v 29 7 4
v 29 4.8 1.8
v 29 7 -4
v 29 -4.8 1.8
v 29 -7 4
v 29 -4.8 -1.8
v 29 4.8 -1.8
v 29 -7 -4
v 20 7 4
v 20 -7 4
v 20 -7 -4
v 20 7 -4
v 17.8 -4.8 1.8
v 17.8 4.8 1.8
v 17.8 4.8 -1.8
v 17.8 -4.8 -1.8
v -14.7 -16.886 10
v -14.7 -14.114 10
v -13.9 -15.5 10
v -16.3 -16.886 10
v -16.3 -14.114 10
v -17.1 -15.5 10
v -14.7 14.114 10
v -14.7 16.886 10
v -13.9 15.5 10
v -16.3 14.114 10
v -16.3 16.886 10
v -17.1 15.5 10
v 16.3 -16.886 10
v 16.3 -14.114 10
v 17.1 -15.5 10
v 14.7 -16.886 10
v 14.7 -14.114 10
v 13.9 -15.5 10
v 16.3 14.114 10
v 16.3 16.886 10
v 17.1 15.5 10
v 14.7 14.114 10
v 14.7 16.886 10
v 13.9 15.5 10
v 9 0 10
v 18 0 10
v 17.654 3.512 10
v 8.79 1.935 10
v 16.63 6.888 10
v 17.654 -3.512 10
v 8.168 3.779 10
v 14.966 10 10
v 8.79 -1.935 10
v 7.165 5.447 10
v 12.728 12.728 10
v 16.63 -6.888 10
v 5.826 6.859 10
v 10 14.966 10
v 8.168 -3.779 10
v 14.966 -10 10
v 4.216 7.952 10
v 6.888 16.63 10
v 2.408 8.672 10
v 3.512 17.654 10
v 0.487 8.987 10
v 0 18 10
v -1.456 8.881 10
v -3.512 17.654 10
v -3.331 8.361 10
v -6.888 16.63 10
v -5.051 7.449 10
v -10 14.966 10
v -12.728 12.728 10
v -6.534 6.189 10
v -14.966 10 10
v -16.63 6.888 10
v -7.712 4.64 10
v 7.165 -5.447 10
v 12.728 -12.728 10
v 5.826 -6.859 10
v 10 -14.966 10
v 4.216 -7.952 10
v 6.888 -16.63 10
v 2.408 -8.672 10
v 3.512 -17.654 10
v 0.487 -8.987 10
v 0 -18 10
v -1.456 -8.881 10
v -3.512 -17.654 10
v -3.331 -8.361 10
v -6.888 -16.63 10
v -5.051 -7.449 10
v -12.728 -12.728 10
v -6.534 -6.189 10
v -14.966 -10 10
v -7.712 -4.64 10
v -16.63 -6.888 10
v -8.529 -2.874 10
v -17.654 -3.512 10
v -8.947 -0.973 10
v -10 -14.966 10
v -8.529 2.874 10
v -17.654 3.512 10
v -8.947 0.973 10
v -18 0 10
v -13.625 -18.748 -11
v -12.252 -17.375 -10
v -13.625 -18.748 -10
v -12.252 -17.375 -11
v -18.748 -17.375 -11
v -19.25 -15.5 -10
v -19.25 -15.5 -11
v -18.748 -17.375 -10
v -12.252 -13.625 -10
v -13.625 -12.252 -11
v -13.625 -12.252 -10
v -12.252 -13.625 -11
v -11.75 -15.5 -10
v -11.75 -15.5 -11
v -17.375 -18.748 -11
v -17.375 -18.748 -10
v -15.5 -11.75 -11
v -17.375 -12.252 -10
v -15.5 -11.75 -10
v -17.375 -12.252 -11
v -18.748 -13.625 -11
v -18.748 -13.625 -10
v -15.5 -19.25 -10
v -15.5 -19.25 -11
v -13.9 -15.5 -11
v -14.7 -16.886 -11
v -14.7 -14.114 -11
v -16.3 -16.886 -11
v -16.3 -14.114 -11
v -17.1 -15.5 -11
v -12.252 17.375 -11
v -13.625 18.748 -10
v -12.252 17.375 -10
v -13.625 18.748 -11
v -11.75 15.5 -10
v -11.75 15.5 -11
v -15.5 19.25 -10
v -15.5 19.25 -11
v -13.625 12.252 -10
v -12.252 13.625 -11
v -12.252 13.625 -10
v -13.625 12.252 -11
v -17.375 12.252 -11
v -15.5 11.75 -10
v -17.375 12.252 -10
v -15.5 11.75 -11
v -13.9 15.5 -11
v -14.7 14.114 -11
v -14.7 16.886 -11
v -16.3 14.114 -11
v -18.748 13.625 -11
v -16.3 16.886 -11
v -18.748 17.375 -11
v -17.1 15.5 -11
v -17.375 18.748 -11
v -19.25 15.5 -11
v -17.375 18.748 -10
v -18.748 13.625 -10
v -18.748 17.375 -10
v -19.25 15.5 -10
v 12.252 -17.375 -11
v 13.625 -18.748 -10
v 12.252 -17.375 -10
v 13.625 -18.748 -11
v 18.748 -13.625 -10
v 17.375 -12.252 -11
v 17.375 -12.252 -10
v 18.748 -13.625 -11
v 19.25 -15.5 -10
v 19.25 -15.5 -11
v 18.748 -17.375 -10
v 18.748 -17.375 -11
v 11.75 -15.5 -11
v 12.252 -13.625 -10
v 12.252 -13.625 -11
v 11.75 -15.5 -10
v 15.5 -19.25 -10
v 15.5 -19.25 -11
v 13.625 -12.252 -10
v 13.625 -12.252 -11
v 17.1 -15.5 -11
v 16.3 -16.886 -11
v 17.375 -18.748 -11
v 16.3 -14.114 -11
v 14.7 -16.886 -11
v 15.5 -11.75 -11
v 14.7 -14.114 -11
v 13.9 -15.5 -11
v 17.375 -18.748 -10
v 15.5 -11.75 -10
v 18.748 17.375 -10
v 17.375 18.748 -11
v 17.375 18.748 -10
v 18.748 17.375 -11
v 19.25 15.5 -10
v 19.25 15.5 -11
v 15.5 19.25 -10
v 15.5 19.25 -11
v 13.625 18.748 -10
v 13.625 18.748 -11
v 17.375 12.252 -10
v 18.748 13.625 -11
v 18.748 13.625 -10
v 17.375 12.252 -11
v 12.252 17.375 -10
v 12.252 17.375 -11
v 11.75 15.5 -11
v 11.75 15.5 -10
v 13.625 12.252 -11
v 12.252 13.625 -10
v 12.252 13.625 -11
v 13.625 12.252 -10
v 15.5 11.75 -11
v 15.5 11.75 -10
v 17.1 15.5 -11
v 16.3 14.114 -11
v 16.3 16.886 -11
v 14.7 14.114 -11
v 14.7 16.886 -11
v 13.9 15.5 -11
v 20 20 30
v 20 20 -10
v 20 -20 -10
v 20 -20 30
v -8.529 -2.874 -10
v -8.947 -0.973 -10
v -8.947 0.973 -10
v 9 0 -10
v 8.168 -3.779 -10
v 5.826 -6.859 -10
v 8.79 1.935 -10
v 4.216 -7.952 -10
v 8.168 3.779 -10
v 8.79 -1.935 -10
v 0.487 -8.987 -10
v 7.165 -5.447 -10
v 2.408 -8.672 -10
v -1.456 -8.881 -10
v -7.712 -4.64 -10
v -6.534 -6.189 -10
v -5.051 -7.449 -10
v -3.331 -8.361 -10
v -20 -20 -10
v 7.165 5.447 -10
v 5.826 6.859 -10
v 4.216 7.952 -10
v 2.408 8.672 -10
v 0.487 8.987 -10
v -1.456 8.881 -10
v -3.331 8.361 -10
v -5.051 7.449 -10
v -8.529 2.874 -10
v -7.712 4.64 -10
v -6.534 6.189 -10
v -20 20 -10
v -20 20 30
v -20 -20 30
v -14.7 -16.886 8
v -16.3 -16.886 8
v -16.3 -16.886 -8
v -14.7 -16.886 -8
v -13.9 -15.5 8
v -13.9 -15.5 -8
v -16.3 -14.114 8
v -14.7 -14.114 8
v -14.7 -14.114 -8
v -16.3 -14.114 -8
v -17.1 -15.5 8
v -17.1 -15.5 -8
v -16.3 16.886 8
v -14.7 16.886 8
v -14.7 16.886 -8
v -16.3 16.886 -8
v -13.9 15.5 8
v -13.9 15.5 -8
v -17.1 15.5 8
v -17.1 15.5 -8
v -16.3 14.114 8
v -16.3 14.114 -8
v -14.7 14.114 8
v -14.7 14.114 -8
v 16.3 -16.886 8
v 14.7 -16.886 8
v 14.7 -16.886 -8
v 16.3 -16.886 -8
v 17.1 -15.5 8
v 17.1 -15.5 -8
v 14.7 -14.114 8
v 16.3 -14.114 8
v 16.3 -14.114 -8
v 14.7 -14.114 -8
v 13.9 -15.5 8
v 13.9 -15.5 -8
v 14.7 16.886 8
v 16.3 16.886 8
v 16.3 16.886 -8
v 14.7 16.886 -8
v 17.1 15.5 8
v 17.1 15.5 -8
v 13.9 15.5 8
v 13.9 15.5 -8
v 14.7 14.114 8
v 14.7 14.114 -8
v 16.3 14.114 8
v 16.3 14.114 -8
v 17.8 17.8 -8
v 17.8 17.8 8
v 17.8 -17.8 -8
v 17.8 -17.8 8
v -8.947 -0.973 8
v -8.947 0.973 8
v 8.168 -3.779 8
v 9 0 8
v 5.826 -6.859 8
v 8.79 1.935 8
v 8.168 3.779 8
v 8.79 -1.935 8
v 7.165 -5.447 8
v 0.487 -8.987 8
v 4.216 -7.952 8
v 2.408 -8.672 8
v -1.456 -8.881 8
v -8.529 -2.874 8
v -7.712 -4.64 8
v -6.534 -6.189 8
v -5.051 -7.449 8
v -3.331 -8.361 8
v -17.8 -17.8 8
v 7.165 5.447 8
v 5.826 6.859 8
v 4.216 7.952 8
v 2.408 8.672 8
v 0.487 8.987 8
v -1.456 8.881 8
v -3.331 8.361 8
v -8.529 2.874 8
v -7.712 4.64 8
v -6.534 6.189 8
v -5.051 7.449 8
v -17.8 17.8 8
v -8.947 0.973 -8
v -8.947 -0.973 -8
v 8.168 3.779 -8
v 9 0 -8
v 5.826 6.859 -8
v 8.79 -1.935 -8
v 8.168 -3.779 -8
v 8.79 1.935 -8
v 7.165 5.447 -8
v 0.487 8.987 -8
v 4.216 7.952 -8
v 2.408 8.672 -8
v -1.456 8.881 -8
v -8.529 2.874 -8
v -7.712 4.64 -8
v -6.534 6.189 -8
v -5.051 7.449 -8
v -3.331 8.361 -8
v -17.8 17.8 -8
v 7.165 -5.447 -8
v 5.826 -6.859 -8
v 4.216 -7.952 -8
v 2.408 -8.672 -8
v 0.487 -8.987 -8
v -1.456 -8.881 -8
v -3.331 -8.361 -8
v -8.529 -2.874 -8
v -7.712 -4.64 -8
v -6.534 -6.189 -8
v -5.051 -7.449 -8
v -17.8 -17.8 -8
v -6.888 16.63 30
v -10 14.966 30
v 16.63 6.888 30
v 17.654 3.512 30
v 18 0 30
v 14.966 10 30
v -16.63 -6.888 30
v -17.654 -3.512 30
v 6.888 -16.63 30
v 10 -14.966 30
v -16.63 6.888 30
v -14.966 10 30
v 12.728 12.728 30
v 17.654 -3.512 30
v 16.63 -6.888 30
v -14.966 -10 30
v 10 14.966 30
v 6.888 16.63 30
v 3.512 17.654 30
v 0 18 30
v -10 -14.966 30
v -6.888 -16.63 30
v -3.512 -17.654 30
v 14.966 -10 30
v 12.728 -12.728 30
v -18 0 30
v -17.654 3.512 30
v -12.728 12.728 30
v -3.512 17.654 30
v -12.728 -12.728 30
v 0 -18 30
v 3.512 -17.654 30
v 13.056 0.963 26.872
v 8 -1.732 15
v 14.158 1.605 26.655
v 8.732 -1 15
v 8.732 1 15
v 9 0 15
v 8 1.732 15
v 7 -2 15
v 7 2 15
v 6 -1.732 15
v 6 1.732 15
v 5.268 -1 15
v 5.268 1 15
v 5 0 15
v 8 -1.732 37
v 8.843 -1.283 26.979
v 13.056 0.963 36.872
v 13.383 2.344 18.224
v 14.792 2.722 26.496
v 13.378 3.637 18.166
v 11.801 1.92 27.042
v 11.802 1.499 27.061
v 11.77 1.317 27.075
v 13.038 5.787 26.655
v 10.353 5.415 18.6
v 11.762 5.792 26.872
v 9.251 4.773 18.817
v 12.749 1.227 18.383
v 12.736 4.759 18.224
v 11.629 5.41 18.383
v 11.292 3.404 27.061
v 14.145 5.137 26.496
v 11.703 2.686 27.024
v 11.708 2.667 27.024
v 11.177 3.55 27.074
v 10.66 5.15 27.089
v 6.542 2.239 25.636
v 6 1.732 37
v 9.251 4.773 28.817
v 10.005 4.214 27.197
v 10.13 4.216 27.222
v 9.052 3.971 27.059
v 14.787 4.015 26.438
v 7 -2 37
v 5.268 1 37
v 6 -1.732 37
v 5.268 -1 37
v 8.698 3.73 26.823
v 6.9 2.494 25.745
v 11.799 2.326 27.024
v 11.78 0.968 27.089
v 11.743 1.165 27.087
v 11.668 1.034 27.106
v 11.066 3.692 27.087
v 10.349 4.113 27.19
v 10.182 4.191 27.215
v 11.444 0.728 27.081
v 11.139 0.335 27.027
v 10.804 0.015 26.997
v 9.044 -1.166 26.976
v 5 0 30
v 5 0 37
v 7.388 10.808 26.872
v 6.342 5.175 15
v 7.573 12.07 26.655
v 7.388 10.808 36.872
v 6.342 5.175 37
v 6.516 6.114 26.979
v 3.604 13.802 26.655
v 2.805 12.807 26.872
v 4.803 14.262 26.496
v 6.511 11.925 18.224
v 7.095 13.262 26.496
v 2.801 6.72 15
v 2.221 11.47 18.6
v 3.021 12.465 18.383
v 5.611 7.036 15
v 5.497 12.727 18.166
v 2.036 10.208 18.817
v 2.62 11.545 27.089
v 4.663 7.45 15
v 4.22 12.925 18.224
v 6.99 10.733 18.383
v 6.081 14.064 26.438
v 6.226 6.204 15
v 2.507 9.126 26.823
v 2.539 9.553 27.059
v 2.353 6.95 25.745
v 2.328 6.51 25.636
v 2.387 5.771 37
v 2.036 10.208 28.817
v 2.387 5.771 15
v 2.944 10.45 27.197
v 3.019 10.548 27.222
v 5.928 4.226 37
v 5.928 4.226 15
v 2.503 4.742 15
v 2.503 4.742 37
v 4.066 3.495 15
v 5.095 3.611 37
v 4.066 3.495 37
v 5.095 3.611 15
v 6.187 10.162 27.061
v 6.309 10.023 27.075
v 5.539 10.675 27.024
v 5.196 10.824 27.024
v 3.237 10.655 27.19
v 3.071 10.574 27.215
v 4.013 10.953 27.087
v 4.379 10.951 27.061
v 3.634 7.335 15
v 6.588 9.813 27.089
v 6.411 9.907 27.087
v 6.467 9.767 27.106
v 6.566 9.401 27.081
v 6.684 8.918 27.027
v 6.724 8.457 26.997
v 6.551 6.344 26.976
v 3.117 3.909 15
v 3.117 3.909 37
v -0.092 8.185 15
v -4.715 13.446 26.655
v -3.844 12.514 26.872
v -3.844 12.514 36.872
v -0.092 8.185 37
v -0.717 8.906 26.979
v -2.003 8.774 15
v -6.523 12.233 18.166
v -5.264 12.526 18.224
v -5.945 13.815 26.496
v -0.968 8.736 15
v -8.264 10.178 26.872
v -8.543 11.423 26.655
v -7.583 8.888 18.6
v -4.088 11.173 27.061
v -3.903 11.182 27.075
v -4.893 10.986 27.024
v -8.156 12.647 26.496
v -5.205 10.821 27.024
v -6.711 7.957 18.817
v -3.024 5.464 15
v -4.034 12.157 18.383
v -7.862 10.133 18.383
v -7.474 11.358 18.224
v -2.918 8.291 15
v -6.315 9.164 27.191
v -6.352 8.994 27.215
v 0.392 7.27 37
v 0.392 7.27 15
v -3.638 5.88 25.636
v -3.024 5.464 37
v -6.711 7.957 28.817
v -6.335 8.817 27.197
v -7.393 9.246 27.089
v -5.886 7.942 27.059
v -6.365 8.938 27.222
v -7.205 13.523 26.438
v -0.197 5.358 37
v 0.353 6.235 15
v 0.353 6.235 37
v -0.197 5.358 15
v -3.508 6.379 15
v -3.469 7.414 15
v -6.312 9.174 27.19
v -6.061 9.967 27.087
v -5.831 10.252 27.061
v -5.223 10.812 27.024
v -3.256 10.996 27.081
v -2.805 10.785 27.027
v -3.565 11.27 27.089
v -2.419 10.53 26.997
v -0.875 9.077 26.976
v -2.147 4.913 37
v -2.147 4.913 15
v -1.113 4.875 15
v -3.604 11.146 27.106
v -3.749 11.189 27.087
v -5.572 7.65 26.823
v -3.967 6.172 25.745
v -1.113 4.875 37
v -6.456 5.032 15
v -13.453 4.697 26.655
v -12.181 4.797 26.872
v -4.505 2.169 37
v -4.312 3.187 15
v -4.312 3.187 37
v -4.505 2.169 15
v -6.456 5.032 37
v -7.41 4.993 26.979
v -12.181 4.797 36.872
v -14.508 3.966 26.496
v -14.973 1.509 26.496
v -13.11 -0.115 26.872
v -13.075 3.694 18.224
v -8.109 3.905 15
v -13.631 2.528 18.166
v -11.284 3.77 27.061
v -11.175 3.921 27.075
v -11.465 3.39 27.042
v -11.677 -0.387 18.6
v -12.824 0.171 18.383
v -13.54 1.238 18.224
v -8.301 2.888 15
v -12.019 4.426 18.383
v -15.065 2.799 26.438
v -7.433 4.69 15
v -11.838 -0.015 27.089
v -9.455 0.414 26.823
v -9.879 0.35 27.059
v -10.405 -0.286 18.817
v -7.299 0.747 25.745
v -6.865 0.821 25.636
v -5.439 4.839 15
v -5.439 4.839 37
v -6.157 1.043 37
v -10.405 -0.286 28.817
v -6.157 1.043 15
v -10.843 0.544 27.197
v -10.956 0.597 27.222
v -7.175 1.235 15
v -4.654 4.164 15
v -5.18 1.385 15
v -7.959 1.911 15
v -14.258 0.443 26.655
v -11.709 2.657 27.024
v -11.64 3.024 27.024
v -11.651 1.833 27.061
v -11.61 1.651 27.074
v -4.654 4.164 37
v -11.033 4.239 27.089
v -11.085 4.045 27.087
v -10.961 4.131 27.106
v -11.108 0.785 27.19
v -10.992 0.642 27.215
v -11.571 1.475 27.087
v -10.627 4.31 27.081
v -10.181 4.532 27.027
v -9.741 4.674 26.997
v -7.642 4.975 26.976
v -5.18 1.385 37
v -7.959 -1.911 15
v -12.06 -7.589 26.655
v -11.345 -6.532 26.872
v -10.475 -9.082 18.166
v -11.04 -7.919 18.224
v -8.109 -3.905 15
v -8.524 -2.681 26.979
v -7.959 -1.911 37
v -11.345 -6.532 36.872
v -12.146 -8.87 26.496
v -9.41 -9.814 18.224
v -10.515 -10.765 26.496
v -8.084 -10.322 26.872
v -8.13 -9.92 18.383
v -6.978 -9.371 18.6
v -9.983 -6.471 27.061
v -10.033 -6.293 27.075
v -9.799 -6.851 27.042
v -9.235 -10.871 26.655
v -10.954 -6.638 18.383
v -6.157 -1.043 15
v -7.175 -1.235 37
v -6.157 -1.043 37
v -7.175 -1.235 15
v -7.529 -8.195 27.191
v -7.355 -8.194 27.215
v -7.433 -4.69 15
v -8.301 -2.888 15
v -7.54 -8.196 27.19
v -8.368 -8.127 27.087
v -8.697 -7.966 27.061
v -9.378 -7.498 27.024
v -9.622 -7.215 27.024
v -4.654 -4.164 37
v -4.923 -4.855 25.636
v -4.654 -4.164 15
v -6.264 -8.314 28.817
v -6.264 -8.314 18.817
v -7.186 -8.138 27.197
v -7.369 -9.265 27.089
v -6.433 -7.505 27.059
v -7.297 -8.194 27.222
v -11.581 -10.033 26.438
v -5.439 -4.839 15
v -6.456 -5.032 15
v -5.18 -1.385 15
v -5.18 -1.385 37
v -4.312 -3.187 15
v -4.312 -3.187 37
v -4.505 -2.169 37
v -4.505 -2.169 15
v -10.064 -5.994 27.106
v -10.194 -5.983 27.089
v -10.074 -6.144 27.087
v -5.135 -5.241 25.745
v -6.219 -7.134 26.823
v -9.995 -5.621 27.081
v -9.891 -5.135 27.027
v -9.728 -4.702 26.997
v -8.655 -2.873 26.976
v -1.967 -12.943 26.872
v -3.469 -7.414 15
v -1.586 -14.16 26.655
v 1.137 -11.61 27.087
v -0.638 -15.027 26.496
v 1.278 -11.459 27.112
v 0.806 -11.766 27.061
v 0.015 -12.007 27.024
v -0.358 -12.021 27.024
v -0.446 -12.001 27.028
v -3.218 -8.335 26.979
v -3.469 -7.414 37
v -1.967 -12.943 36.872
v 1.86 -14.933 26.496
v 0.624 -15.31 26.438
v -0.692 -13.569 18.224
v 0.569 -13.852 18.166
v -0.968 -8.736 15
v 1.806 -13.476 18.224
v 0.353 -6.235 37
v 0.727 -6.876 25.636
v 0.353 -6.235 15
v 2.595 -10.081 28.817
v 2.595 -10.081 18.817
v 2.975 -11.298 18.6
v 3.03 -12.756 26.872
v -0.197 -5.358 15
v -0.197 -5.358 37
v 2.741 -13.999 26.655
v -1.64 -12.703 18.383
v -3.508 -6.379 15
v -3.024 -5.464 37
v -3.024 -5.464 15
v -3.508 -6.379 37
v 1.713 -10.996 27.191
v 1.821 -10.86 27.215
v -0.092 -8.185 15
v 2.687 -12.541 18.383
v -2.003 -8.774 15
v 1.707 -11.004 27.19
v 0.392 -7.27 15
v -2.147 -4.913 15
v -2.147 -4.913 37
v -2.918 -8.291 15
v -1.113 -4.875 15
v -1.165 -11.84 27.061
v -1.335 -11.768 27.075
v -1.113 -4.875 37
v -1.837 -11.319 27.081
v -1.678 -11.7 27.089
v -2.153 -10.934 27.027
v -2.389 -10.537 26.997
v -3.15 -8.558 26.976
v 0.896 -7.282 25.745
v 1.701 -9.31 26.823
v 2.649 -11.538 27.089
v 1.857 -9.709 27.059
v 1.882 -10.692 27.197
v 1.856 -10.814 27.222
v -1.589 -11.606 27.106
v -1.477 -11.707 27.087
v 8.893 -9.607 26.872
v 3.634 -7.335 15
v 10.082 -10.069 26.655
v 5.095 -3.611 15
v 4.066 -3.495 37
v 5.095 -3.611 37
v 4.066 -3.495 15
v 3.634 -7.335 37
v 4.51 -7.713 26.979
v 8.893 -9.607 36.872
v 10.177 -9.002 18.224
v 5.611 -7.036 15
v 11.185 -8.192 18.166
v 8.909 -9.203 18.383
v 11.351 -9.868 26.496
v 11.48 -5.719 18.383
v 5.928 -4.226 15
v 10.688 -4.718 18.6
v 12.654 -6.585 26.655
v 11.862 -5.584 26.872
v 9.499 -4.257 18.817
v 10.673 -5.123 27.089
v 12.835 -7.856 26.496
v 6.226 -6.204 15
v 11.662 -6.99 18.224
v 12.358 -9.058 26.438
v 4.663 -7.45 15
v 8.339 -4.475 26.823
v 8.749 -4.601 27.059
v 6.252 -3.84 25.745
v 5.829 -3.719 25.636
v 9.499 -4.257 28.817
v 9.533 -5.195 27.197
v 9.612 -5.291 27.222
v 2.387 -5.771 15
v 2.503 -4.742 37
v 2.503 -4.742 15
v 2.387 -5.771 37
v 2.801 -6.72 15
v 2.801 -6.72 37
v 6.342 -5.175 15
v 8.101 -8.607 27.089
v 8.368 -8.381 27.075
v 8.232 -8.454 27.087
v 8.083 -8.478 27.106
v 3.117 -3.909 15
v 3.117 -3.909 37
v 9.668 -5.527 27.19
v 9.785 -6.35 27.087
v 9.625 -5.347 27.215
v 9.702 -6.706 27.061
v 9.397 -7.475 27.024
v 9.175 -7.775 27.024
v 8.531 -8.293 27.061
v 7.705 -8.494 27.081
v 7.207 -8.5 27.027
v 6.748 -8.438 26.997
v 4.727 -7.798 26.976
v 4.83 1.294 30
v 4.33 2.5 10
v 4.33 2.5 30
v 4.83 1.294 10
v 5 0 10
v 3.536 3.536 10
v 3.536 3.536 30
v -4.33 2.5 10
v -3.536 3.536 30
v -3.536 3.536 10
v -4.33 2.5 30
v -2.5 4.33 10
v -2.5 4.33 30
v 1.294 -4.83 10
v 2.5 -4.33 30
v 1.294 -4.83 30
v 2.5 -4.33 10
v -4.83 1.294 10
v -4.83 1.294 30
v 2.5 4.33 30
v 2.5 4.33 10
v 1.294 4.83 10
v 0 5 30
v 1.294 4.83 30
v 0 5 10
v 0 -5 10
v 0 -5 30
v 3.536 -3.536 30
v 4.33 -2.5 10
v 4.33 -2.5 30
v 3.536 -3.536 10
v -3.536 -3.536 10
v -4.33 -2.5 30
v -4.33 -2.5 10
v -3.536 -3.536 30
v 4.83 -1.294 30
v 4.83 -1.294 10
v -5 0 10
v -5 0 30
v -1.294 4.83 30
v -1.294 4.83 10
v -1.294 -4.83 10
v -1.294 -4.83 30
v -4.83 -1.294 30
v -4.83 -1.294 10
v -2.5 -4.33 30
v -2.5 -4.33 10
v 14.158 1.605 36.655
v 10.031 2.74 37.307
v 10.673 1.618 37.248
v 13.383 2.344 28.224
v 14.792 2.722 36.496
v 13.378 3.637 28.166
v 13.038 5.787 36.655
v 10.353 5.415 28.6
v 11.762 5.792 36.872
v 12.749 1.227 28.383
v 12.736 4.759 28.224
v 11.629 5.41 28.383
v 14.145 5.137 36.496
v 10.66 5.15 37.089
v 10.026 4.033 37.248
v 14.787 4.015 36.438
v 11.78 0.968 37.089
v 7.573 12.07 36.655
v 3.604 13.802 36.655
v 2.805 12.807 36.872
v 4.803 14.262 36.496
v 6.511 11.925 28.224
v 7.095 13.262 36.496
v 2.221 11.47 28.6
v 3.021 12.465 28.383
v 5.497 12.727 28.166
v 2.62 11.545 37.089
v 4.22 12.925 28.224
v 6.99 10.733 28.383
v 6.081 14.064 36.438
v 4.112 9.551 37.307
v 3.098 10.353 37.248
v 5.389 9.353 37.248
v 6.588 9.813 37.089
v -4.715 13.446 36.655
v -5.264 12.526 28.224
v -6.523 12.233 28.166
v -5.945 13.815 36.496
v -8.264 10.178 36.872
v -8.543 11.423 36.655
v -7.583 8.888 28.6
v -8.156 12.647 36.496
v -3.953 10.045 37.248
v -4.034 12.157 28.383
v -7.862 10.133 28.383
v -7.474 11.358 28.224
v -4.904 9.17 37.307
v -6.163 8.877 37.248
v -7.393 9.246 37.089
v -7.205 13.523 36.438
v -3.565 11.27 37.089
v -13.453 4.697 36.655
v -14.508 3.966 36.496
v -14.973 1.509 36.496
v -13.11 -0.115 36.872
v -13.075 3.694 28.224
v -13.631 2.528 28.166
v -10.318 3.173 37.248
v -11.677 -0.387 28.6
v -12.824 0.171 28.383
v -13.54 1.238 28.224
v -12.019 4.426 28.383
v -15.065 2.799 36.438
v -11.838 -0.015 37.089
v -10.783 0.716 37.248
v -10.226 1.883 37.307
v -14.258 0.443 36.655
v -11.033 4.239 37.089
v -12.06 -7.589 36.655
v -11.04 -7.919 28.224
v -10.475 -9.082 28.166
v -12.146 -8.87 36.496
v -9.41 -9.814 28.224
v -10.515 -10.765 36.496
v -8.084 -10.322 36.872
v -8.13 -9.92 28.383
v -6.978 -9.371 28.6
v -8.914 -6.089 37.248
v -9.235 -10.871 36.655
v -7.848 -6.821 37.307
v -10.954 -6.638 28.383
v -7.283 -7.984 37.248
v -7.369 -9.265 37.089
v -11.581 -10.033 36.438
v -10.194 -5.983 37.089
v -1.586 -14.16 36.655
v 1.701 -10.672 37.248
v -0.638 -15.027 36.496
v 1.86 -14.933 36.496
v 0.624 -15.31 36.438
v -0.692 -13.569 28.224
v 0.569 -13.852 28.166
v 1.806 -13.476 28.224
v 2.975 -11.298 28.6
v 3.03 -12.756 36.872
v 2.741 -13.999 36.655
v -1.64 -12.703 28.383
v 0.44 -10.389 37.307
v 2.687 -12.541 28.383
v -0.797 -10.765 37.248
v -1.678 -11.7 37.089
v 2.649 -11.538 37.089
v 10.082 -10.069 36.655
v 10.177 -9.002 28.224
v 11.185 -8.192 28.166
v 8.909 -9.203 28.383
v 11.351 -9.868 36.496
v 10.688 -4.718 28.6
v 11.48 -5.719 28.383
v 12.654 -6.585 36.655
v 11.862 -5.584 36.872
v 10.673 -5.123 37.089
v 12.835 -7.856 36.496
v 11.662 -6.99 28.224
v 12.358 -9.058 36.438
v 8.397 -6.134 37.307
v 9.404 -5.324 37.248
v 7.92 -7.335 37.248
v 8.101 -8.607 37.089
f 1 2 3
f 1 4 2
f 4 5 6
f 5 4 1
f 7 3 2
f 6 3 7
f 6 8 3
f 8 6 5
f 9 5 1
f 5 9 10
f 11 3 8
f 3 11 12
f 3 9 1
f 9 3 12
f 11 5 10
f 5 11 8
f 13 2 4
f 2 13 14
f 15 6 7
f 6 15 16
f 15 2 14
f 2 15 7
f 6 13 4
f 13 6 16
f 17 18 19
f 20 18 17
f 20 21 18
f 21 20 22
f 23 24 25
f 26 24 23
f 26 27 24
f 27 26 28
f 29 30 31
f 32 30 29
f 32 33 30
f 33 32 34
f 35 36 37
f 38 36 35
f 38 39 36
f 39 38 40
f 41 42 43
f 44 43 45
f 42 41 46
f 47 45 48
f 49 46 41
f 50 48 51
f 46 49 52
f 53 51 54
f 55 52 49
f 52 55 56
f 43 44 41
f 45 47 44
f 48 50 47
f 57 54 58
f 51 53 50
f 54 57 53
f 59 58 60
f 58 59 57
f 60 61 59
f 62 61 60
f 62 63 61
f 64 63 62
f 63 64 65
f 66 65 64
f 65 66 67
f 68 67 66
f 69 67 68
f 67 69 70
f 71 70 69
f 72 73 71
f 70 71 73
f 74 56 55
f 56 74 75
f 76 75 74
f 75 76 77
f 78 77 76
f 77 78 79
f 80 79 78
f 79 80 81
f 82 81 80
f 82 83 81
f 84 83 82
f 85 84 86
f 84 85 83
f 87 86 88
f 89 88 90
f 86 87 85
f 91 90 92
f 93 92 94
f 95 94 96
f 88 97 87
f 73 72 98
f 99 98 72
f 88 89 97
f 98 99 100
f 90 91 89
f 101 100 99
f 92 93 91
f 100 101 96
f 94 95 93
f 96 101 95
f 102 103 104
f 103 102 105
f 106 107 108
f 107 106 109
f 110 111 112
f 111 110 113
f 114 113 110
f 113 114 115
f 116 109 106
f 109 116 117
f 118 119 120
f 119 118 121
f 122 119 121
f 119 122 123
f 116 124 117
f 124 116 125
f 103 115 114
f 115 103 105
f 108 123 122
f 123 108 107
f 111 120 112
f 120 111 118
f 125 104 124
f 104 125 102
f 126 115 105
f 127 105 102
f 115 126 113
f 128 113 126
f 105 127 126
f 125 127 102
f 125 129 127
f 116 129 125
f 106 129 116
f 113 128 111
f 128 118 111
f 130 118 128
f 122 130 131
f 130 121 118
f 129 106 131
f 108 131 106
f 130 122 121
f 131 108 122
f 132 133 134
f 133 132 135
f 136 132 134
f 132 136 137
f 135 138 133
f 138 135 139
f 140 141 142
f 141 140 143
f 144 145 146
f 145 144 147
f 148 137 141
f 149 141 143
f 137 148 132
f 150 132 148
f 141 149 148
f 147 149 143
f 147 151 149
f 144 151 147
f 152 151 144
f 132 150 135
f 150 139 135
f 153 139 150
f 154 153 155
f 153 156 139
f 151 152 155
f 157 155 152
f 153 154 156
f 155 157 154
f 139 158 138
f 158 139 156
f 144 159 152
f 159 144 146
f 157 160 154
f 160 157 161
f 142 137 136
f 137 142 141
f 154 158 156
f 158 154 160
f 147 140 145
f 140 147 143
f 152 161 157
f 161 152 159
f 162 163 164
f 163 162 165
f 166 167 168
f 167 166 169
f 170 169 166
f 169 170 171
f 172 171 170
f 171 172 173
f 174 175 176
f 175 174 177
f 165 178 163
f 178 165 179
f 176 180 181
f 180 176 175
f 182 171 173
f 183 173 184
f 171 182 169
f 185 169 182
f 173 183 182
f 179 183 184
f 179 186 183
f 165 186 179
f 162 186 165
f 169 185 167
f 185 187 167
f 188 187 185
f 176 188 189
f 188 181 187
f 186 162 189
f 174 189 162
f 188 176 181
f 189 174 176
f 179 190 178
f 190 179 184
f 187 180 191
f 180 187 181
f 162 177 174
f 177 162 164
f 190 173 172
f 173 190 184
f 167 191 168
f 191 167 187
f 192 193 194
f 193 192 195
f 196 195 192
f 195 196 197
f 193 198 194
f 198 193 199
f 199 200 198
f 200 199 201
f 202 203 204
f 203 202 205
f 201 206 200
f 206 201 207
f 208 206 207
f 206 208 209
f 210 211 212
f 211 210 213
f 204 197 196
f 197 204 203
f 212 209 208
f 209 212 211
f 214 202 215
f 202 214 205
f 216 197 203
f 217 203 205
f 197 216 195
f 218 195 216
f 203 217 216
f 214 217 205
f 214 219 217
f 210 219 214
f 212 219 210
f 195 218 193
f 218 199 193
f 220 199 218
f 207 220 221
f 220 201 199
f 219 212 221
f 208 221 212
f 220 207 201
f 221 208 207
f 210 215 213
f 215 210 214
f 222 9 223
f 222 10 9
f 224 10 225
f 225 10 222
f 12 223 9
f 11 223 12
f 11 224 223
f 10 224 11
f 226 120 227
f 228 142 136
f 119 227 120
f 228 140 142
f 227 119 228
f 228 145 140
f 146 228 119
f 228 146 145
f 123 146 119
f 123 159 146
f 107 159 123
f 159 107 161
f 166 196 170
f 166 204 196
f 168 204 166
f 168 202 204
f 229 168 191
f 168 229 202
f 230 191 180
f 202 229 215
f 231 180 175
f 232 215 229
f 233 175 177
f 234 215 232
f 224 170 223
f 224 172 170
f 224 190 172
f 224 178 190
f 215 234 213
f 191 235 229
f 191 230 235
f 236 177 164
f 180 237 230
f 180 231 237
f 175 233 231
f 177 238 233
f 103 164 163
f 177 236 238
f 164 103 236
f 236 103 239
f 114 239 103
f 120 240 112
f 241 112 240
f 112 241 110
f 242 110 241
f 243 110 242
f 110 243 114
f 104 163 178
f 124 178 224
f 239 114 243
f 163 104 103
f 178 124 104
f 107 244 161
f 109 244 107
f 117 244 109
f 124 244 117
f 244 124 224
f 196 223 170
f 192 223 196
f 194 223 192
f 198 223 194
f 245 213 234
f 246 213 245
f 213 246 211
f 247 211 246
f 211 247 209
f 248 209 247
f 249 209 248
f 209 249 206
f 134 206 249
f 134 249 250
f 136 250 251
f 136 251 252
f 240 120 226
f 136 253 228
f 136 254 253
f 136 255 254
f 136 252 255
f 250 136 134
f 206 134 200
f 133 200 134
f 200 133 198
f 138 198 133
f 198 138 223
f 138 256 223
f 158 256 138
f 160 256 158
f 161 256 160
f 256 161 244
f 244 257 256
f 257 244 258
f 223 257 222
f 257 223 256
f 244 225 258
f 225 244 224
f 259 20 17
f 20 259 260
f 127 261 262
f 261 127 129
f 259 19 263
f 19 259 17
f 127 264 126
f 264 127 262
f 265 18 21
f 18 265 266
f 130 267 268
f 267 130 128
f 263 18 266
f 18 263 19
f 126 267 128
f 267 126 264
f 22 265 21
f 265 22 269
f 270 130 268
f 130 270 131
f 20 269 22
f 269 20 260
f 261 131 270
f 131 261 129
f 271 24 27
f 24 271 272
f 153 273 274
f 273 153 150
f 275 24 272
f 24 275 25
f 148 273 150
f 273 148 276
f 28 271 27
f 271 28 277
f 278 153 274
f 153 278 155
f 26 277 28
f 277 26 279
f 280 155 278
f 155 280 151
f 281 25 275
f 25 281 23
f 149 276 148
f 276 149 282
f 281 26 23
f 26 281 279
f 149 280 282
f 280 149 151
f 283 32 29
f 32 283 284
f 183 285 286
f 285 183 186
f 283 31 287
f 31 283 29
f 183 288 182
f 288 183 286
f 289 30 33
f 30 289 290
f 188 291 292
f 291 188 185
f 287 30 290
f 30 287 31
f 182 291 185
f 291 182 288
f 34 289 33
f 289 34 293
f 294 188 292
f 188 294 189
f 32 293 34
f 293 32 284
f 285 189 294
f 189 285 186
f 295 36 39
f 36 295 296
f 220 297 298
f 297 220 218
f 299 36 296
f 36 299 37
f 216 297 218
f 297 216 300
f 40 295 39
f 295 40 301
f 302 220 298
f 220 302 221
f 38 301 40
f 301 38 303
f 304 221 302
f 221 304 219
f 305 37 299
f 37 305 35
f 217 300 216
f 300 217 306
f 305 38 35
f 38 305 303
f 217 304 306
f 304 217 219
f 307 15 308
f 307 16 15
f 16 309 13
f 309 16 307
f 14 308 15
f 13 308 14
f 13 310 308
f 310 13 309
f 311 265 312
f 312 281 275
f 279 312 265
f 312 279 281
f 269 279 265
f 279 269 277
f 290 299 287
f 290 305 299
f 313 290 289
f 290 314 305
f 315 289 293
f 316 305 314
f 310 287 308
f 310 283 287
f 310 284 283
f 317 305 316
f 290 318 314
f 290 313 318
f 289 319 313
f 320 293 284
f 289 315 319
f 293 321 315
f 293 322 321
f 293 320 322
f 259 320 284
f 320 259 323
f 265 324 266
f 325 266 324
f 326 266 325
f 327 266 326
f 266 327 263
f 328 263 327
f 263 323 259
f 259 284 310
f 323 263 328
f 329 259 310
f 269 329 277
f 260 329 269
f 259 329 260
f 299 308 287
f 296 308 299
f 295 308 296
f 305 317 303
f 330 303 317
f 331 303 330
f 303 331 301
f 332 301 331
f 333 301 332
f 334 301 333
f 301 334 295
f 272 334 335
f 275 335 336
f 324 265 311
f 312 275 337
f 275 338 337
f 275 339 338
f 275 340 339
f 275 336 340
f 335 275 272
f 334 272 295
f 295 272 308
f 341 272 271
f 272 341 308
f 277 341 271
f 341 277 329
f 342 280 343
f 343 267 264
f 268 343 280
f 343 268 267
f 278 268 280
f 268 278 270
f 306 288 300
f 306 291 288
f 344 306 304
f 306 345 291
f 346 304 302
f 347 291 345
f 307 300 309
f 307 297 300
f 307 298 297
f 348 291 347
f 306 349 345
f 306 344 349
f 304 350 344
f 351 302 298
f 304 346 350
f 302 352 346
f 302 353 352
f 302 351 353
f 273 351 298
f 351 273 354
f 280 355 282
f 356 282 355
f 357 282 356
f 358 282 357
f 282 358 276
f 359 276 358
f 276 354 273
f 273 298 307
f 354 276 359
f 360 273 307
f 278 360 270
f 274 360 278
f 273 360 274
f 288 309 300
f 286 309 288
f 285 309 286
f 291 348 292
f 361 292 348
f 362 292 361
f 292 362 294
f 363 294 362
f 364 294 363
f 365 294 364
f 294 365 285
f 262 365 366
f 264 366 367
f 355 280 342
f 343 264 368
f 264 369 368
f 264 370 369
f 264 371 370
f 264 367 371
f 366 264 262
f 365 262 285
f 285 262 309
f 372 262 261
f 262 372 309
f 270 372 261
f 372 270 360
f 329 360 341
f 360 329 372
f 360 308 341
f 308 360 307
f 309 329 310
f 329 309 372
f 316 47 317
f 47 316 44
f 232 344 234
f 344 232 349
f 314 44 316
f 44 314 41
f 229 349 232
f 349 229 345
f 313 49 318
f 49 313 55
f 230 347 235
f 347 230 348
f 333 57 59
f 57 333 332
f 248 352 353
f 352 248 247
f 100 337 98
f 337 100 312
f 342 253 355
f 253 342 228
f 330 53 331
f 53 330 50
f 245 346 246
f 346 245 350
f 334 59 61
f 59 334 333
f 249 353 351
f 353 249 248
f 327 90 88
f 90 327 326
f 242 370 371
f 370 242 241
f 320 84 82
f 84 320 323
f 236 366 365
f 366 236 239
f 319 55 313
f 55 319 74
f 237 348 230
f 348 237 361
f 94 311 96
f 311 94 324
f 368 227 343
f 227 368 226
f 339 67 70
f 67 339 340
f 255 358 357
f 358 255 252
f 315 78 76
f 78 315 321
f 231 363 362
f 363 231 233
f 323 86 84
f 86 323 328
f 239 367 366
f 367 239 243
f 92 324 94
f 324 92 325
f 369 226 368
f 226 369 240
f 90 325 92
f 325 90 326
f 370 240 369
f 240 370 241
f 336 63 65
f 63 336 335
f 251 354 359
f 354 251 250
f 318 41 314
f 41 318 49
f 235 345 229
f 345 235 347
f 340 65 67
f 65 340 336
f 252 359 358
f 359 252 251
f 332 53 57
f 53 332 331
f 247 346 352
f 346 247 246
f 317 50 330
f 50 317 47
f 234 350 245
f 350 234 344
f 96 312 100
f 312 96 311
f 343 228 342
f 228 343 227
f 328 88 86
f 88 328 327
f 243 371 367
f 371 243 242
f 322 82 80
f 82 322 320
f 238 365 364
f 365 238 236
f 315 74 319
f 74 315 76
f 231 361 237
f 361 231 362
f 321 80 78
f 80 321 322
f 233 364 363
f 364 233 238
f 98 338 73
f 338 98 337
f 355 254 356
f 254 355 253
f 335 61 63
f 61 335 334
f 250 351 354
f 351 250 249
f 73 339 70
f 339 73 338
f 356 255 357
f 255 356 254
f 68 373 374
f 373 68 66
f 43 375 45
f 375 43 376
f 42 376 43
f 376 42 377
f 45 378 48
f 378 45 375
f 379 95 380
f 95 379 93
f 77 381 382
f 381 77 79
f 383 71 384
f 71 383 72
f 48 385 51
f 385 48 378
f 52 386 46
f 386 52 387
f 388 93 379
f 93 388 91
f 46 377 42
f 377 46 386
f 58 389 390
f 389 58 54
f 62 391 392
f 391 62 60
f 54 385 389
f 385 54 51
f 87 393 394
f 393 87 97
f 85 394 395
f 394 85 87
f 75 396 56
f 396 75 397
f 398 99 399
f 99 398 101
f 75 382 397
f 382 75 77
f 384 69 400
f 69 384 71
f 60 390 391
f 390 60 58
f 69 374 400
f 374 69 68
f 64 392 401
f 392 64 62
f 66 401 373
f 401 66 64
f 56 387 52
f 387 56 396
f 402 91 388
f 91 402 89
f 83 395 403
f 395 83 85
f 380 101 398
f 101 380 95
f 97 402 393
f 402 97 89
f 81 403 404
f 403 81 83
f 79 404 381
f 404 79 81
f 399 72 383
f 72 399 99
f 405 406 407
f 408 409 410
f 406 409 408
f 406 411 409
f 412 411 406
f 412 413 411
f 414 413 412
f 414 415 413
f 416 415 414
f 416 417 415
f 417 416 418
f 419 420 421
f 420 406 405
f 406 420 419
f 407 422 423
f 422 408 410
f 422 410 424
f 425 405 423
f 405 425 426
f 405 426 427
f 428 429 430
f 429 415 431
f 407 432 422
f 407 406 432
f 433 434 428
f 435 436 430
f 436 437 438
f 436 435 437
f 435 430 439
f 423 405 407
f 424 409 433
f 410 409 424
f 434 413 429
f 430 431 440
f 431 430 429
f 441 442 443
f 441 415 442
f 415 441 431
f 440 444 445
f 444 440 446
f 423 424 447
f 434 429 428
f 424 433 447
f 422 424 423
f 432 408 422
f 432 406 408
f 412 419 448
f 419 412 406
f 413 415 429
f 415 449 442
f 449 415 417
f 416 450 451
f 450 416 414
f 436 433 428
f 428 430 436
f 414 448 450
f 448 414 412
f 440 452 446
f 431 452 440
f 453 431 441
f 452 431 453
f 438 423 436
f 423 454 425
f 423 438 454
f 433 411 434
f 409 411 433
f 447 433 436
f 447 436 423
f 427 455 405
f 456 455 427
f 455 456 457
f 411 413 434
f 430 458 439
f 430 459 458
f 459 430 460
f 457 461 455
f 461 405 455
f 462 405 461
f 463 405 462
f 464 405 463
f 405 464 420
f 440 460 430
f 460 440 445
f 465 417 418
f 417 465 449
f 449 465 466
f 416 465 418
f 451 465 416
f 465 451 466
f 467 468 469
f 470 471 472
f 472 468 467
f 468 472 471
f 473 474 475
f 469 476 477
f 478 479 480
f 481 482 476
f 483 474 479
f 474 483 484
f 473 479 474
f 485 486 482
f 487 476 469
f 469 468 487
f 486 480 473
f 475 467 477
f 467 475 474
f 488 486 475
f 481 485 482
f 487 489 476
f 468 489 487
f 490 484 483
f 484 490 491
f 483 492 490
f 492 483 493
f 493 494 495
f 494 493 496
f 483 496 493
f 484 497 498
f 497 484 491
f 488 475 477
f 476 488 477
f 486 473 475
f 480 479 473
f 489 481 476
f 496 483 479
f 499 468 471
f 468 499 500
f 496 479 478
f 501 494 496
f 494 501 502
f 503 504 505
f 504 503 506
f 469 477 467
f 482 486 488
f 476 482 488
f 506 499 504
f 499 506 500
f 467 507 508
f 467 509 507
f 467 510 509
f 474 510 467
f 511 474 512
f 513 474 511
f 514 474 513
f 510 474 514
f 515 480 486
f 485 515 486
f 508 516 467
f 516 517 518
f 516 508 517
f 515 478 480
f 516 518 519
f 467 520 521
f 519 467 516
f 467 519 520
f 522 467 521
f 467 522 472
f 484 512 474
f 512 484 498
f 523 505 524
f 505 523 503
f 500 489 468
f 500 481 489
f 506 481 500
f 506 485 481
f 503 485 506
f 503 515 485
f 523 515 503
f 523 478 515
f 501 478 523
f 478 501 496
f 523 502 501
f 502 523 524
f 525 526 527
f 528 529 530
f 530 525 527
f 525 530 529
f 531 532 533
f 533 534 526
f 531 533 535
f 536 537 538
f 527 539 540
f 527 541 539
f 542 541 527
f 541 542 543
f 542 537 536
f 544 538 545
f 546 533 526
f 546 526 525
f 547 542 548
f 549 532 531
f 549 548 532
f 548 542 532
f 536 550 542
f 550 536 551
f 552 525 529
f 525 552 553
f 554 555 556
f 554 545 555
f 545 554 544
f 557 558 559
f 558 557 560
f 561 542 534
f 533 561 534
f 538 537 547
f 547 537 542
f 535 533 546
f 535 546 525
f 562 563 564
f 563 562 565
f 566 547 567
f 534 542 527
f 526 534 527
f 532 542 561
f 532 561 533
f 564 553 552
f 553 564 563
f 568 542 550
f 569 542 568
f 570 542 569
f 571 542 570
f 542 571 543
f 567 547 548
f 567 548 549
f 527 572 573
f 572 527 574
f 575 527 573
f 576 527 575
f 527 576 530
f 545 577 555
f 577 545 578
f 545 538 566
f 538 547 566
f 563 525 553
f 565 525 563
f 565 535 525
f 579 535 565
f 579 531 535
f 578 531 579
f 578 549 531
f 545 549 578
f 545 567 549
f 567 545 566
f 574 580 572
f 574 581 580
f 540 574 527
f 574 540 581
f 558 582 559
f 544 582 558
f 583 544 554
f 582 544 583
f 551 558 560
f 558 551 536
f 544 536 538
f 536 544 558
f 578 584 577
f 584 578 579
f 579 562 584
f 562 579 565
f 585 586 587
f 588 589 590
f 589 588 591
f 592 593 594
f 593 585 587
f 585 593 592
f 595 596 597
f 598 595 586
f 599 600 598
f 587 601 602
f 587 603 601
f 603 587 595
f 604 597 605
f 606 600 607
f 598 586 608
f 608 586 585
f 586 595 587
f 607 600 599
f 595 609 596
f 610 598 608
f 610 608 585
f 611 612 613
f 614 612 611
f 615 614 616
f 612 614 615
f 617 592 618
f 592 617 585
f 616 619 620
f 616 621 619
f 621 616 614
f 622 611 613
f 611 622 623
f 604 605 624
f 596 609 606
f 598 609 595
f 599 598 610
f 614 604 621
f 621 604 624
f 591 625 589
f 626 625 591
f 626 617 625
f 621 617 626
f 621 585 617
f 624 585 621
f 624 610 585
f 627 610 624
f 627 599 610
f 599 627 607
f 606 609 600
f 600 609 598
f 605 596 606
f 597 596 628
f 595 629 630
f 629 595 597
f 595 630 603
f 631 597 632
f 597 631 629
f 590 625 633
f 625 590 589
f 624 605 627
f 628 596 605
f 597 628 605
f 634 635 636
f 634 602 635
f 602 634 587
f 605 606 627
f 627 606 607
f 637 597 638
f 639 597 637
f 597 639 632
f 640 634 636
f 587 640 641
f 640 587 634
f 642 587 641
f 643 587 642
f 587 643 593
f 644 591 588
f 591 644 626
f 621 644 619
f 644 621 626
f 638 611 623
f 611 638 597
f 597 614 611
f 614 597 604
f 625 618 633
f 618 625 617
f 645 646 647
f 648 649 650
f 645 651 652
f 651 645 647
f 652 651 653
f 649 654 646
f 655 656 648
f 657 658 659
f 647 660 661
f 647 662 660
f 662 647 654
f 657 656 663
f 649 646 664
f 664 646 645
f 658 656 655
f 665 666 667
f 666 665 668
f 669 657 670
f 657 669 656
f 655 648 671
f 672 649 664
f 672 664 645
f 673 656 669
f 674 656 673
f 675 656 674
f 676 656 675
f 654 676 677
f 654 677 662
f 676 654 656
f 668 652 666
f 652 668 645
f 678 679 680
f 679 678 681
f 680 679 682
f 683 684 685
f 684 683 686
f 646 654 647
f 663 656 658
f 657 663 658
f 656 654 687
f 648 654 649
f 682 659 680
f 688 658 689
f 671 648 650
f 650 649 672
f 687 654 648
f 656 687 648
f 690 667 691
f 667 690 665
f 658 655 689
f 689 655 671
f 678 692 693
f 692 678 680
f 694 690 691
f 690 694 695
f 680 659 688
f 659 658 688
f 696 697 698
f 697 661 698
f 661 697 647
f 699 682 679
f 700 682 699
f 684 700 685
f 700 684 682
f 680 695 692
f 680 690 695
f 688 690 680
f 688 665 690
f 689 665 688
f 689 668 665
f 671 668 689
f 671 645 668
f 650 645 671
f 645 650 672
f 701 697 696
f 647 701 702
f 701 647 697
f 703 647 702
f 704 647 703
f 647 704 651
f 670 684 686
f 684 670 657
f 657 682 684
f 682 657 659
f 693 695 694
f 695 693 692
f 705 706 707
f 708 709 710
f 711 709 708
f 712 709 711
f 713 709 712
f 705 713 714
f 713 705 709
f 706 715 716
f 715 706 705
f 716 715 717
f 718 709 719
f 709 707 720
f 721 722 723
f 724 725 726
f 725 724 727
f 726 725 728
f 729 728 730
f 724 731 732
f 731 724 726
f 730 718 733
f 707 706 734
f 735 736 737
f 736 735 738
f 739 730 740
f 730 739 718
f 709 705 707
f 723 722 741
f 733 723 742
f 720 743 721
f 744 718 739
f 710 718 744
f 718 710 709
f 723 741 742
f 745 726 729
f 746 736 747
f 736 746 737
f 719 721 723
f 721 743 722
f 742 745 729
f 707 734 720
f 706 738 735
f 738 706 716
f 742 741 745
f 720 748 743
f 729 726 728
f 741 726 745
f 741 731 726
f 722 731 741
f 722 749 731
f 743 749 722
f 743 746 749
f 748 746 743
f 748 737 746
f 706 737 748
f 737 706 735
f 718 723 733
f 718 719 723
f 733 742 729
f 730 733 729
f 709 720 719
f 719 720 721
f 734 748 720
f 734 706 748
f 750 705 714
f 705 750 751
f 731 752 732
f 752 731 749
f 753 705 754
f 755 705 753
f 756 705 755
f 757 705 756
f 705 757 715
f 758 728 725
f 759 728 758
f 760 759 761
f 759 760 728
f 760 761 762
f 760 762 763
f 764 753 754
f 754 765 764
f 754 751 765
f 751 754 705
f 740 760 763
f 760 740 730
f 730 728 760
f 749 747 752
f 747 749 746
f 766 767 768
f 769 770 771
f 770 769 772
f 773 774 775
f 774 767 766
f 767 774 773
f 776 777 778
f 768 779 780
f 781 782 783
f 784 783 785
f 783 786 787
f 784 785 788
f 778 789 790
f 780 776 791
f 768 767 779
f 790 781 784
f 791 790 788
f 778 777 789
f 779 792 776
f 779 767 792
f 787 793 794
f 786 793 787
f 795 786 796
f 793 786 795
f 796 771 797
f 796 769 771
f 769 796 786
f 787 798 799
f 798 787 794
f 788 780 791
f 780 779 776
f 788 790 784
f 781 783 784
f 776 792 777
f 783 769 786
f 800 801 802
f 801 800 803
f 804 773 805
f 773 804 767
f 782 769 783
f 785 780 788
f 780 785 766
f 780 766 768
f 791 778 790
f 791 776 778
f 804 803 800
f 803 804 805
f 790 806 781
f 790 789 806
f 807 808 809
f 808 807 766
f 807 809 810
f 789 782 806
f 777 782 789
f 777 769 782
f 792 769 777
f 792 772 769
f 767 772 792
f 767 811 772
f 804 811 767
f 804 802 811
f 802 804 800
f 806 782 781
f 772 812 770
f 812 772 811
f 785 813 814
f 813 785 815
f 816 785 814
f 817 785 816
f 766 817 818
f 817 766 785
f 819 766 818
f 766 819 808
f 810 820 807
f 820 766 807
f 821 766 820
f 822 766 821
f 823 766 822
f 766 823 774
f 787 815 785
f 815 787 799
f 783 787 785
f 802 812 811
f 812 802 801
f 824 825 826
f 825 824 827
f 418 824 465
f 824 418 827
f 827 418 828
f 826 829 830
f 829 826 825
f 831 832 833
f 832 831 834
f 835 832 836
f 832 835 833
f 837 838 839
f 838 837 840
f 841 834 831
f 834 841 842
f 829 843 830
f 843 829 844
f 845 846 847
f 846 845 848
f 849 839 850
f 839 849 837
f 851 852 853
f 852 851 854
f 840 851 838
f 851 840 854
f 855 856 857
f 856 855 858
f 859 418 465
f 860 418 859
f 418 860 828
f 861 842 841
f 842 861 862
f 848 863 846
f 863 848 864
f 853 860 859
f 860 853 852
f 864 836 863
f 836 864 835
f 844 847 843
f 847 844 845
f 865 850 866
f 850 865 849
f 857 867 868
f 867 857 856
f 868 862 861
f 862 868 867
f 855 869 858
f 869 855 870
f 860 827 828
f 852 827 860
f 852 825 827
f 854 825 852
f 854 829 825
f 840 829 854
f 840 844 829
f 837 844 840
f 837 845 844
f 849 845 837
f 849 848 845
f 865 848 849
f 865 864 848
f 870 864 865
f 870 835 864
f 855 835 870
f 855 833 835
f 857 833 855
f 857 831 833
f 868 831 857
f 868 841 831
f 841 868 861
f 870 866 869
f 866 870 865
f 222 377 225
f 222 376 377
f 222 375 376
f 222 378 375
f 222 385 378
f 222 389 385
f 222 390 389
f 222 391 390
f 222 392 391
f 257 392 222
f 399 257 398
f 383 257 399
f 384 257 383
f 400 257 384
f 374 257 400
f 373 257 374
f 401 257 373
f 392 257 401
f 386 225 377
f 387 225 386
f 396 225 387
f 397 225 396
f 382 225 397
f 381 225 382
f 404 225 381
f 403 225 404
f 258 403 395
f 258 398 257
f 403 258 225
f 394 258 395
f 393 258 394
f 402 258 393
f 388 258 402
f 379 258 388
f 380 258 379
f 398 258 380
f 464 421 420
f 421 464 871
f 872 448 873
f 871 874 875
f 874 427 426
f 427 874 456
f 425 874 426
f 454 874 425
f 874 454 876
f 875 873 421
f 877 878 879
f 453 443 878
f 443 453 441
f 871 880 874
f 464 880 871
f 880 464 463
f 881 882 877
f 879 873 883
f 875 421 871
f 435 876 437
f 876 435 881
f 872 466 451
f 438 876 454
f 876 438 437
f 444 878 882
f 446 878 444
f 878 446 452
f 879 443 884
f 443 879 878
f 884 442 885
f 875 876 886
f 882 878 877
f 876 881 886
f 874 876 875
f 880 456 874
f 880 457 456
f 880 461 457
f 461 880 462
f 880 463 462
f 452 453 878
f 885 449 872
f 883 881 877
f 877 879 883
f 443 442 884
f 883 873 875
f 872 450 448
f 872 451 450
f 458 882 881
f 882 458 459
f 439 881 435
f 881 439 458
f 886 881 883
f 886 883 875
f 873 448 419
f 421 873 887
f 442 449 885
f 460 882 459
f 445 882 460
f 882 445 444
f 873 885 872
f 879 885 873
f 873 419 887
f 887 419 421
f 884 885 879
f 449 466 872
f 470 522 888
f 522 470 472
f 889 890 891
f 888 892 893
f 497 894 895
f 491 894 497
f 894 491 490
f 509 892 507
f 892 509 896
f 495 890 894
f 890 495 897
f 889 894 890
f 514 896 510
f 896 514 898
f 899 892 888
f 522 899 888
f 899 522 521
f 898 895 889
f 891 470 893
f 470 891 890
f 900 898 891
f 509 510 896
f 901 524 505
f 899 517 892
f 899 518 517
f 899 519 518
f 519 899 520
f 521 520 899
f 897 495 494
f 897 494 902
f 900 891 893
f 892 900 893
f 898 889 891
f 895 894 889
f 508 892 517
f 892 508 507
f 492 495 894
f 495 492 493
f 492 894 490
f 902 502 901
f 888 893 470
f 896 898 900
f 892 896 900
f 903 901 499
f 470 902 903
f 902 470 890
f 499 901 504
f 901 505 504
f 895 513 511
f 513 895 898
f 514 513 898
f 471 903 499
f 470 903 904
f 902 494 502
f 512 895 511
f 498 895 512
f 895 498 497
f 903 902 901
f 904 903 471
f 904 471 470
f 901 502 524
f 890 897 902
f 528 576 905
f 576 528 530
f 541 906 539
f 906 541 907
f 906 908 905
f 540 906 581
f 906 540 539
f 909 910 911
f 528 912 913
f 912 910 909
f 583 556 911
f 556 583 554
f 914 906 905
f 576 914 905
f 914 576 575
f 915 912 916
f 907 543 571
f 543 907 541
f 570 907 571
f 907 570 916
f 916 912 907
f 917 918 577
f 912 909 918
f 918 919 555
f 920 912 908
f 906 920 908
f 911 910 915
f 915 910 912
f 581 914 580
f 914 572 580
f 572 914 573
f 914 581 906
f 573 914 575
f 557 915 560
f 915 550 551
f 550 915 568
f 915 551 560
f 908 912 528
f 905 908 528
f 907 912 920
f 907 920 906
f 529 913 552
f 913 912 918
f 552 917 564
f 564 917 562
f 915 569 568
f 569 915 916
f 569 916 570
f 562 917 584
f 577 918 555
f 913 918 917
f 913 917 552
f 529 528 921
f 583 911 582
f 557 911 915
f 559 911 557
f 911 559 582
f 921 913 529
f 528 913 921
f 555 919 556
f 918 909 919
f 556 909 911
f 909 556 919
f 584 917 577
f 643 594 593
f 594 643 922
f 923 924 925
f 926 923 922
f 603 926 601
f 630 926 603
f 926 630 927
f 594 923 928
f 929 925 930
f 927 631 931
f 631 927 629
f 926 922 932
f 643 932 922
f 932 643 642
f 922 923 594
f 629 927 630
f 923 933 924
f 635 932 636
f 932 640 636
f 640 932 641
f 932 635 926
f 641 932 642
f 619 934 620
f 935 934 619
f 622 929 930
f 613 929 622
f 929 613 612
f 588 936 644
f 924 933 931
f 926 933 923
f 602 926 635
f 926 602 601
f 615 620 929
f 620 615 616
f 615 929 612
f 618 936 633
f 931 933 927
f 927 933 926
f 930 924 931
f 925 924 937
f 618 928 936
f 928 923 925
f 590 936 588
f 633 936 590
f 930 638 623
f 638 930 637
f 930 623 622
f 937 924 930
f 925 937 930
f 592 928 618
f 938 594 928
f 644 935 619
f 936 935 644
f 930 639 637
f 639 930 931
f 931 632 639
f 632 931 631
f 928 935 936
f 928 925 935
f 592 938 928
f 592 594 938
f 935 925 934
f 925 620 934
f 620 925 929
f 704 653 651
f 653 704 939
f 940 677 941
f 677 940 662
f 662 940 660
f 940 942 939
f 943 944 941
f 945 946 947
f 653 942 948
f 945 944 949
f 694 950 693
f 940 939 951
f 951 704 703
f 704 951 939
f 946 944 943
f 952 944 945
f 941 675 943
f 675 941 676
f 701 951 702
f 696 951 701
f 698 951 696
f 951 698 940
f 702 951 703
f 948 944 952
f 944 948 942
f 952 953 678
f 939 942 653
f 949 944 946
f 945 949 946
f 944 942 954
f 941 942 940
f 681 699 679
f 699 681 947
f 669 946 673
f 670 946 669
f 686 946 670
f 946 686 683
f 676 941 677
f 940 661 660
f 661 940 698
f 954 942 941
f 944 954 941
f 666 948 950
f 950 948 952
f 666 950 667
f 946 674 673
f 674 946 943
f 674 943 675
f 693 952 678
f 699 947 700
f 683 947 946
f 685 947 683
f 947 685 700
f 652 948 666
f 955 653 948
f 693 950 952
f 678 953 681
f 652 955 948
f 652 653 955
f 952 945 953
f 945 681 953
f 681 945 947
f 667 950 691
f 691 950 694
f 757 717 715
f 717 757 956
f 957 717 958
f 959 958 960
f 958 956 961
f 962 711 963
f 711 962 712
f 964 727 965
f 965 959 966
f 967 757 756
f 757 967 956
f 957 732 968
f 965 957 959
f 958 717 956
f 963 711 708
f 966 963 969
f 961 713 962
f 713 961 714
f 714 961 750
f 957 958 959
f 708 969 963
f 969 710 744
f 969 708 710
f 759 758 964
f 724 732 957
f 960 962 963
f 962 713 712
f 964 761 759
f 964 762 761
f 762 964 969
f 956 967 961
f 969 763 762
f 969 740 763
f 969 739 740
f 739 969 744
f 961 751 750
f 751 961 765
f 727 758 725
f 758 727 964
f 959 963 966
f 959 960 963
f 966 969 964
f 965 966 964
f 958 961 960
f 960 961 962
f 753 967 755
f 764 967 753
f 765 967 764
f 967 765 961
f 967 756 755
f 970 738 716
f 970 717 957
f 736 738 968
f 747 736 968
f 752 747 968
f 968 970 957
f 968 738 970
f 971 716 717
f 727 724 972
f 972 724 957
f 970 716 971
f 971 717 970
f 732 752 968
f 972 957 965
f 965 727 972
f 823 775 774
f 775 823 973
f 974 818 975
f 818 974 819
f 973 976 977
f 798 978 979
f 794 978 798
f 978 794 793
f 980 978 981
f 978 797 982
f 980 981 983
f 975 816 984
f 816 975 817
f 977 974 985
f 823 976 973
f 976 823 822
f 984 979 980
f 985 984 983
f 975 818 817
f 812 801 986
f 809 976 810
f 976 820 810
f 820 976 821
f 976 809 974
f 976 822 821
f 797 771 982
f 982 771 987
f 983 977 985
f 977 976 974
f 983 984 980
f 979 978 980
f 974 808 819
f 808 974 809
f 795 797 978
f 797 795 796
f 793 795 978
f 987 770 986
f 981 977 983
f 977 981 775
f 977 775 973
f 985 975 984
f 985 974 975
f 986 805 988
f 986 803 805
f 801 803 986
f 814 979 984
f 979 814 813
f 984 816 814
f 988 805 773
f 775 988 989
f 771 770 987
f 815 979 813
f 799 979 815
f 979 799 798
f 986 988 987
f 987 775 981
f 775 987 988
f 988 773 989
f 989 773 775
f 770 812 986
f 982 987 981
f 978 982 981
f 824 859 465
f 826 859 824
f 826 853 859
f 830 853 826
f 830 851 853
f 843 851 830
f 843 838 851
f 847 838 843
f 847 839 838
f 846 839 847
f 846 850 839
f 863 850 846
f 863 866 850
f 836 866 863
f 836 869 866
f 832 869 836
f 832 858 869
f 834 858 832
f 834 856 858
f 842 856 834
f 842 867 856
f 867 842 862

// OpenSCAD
// Parameters
envelope_length_mm = 40; //[20:80:1]
envelope_width_mm = 40; //[20:80:1]
envelope_depth_mm = 20; //[10:40:1]
wall_thickness_mm = 2.2; //[1.1:4.4:0.1]
top_thickness_mm = 2; //[1:4:0.1]
bottom_thickness_mm = 2; //[1:4:0.1]
internal_clearance_mm = 0.6; //[0.2:1.5:0.1]
inlet_bore_d_mm = 18; //[10:28:0.5]
inlet_boss_d_mm = 22; //[14:34:0.5]
inlet_boss_h_mm = 2.5; //[1:6:0.1]
outlet_width_mm = 14; //[8:24:0.5]
outlet_height_mm = 8; //[5:16:0.5]
outlet_length_mm = 10; //[5:25:0.5]
outlet_overlap_mm = 1; //[0.5:2:0.1]
impeller_outer_d_mm = 28; //[18:36:0.5]
impeller_height_mm = 12; //[6:18:0.5]
hub_d_mm = 10; //[6:18:0.5]
hub_height_mm = 10; //[5:18:0.5]
blade_count = 20; //[12:36:1]
blade_thickness_mm = 1; //[0.6:2:0.1]
blade_radial_len_mm = 7; //[4:12:0.5]
blade_overlap_into_hub_mm = 1; //[0.5:2:0.1]
mount_hole_d_mm = 3.2; //[2.4:4.2:0.1]
lug_d_mm = 7.5; //[5:12:0.1]
lug_height_mm = 3; //[2:6:0.1]
lug_inset_mm = 4.5; //[2.5:8:0.1]
screw_hole_overlap_mm = 0.8; //[0.5:2:0.1]

// Blower
module blower() {
  color([0.12, 0.12, 0.14]) {
    difference() {
      // Volute casing
      union() {
        // Outer block
        translate([0, 0, 0])
          cube([envelope_length_mm, envelope_width_mm, envelope_depth_mm], center=true);
        // Outlet nozzle
        translate([envelope_length_mm/2 + outlet_length_mm/2 - outlet_overlap_mm, 0, 0])
          difference() {
            cube([outlet_length_mm, outlet_width_mm, outlet_height_mm], center=true);
            translate([0, 0, 0])
              cube([outlet_length_mm + 2*screw_hole_overlap_mm, outlet_width_mm - 2*wall_thickness_mm, outlet_height_mm - 2*wall_thickness_mm], center=true);
          }
        // Inlet boss ring
        translate([0, 0, envelope_depth_mm/2 - inlet_boss_h_mm/2])
          difference() {
            cylinder(r=inlet_boss_d_mm/2, h=inlet_boss_h_mm, center=true);
            cylinder(r=inlet_bore_d_mm/2, h=inlet_boss_h_mm + 2*screw_hole_overlap_mm, center=true);
          }
        // Mounting lugs
        for (x = [-1, 1], y = [-1, 1]) {
          translate([x * (envelope_length_mm/2 - lug_inset_mm), y * (envelope_width_mm/2 - lug_inset_mm), -envelope_depth_mm/2 + lug_height_mm/2 - 1])
            cylinder(r=lug_d_mm/2, h=lug_height_mm, center=true);
        }
      }
      // Inner cavity
      translate([0, 0, (top_thickness_mm - bottom_thickness_mm)/2])
        cube([envelope_length_mm - 2*wall_thickness_mm, envelope_width_mm - 2*wall_thickness_mm, envelope_depth_mm - top_thickness_mm - bottom_thickness_mm], center=true);
      // Inlet bore
      translate([0, 0, 0])
        cylinder(r=inlet_bore_d_mm/2, h=envelope_depth_mm + 2*screw_hole_overlap_mm, center=true);
      // Outlet port cut in casing
      translate([envelope_length_mm/2 - wall_thickness_mm/2, 0, 0])
        cube([wall_thickness_mm + 2*screw_hole_overlap_mm, outlet_width_mm - 2*wall_thickness_mm, outlet_height_mm - 2*wall_thickness_mm], center=true);
      // Mounting screw holes
      for (x = [-1, 1], y = [-1, 1]) {
        translate([x * (envelope_length_mm/2 - lug_inset_mm), y * (envelope_width_mm/2 - lug_inset_mm), 0])
          cylinder(r=mount_hole_d_mm/2, h=envelope_depth_mm + lug_height_mm + 2*screw_hole_overlap_mm, center=true);
      }
    }
  }
}

// Fan
module fan() {
  color([0.15, 0.15, 0.17]) {
    // Frame
    difference() {
      cube([envelope_length_mm, envelope_width_mm, 10], center=true);
      cylinder(d=envelope_length_mm-4, h=12, center=true, $fn=32);
    }
    // Hub
    cylinder(d=hub_d_mm, h=hub_height_mm, center=true, $fn=24);
    // Blades
    for (i = [0:6]) {
      rotate([0, 0, i*360/7])
        hull() {
          translate([hub_d_mm/2 + 2, 0, 0])
            cylinder(r=2, h=impeller_height_mm, $fn=12);
          translate([impeller_outer_d_mm/2 - 3, 3, impeller_height_mm*0.3])
            rotate([0, 10, 15])
            cylinder(r=2.5, h=impeller_height_mm*0.7, $fn=12);
        }
    }
  }
}

// Blower Fan
module blower_fan() {
  color([0.15, 0.15, 0.17]) {
    // Frame
    difference() {
      cube([envelope_length_mm, envelope_width_mm, 10], center=true);
      cylinder(d=envelope_length_mm-4, h=12, center=true, $fn=32);
    }
    // Hub
    cylinder(d=hub_d_mm, h=hub_height_mm, center=true, $fn=24);
    // Blades
    for (i = [0:6]) {
      rotate([0, 0, i*360/7])
        hull() {
          translate([hub_d_mm/2 + 2, 0, 0])
            cylinder(r=2, h=impeller_height_mm, $fn=12);
          translate([impeller_outer_d_mm/2 - 3, 3, impeller_height_mm*0.3])
            rotate([0, 10, 15])
            cylinder(r=2.5, h=impeller_height_mm*0.7, $fn=12);
        }
    }
  }
}

// Assembly
module assembly() {
  blower();
  translate([0, 0, envelope_depth_mm/2 + 5]) fan();
  translate([0, 0, envelope_depth_mm/2 + 15]) blower_fan();
}

assembly();
